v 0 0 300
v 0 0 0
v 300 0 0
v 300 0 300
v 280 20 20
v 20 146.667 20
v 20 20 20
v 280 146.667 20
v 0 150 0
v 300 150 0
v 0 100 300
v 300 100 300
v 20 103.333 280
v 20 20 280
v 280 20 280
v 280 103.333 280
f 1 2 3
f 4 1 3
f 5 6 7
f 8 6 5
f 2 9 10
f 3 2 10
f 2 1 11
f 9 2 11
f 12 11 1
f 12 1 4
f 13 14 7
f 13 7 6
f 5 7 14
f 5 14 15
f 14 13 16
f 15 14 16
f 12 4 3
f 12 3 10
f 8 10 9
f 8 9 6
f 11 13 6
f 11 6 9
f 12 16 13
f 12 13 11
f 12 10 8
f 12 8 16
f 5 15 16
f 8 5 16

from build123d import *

# Parameters (mm, degrees)
ESQUISSE1_W             = 300
ESQUISSE1_H             = 150
BOSS_EXTRU_1_DEPTH      = 300
ENL_V_MAT_EXTRU_5_DEPTH = 300
COQUE2_T                = -20


with BuildPart() as part:
    # Esquisse1 → Boss.-Extru.1 (new body)
    with BuildSketch(Plane.XY):
        with Locations((150, 75)):
            Rectangle(ESQUISSE1_W, ESQUISSE1_H)
    extrude(amount=BOSS_EXTRU_1_DEPTH)

    # Esquisse5 → Enlèv. mat.-Extru.5 (cut)
    with BuildSketch(Plane(origin=(300, 0, 0), x_dir=(0, 0, -1), z_dir=(1, 0, 0))):
        Polygon((0, 150), (-300, 100), (-300, 150), align=None)
    extrude(amount=-ENL_V_MAT_EXTRU_5_DEPTH, mode=Mode.SUBTRACT)

    # Coque2
    coque2_openings = [part.faces().sort_by_distance(p)[0] for p in [
        (150, 125, 150),
    ]]
    offset(amount=COQUE2_T, openings=coque2_openings, kind=Kind.INTERSECTION)


solid = part.part
